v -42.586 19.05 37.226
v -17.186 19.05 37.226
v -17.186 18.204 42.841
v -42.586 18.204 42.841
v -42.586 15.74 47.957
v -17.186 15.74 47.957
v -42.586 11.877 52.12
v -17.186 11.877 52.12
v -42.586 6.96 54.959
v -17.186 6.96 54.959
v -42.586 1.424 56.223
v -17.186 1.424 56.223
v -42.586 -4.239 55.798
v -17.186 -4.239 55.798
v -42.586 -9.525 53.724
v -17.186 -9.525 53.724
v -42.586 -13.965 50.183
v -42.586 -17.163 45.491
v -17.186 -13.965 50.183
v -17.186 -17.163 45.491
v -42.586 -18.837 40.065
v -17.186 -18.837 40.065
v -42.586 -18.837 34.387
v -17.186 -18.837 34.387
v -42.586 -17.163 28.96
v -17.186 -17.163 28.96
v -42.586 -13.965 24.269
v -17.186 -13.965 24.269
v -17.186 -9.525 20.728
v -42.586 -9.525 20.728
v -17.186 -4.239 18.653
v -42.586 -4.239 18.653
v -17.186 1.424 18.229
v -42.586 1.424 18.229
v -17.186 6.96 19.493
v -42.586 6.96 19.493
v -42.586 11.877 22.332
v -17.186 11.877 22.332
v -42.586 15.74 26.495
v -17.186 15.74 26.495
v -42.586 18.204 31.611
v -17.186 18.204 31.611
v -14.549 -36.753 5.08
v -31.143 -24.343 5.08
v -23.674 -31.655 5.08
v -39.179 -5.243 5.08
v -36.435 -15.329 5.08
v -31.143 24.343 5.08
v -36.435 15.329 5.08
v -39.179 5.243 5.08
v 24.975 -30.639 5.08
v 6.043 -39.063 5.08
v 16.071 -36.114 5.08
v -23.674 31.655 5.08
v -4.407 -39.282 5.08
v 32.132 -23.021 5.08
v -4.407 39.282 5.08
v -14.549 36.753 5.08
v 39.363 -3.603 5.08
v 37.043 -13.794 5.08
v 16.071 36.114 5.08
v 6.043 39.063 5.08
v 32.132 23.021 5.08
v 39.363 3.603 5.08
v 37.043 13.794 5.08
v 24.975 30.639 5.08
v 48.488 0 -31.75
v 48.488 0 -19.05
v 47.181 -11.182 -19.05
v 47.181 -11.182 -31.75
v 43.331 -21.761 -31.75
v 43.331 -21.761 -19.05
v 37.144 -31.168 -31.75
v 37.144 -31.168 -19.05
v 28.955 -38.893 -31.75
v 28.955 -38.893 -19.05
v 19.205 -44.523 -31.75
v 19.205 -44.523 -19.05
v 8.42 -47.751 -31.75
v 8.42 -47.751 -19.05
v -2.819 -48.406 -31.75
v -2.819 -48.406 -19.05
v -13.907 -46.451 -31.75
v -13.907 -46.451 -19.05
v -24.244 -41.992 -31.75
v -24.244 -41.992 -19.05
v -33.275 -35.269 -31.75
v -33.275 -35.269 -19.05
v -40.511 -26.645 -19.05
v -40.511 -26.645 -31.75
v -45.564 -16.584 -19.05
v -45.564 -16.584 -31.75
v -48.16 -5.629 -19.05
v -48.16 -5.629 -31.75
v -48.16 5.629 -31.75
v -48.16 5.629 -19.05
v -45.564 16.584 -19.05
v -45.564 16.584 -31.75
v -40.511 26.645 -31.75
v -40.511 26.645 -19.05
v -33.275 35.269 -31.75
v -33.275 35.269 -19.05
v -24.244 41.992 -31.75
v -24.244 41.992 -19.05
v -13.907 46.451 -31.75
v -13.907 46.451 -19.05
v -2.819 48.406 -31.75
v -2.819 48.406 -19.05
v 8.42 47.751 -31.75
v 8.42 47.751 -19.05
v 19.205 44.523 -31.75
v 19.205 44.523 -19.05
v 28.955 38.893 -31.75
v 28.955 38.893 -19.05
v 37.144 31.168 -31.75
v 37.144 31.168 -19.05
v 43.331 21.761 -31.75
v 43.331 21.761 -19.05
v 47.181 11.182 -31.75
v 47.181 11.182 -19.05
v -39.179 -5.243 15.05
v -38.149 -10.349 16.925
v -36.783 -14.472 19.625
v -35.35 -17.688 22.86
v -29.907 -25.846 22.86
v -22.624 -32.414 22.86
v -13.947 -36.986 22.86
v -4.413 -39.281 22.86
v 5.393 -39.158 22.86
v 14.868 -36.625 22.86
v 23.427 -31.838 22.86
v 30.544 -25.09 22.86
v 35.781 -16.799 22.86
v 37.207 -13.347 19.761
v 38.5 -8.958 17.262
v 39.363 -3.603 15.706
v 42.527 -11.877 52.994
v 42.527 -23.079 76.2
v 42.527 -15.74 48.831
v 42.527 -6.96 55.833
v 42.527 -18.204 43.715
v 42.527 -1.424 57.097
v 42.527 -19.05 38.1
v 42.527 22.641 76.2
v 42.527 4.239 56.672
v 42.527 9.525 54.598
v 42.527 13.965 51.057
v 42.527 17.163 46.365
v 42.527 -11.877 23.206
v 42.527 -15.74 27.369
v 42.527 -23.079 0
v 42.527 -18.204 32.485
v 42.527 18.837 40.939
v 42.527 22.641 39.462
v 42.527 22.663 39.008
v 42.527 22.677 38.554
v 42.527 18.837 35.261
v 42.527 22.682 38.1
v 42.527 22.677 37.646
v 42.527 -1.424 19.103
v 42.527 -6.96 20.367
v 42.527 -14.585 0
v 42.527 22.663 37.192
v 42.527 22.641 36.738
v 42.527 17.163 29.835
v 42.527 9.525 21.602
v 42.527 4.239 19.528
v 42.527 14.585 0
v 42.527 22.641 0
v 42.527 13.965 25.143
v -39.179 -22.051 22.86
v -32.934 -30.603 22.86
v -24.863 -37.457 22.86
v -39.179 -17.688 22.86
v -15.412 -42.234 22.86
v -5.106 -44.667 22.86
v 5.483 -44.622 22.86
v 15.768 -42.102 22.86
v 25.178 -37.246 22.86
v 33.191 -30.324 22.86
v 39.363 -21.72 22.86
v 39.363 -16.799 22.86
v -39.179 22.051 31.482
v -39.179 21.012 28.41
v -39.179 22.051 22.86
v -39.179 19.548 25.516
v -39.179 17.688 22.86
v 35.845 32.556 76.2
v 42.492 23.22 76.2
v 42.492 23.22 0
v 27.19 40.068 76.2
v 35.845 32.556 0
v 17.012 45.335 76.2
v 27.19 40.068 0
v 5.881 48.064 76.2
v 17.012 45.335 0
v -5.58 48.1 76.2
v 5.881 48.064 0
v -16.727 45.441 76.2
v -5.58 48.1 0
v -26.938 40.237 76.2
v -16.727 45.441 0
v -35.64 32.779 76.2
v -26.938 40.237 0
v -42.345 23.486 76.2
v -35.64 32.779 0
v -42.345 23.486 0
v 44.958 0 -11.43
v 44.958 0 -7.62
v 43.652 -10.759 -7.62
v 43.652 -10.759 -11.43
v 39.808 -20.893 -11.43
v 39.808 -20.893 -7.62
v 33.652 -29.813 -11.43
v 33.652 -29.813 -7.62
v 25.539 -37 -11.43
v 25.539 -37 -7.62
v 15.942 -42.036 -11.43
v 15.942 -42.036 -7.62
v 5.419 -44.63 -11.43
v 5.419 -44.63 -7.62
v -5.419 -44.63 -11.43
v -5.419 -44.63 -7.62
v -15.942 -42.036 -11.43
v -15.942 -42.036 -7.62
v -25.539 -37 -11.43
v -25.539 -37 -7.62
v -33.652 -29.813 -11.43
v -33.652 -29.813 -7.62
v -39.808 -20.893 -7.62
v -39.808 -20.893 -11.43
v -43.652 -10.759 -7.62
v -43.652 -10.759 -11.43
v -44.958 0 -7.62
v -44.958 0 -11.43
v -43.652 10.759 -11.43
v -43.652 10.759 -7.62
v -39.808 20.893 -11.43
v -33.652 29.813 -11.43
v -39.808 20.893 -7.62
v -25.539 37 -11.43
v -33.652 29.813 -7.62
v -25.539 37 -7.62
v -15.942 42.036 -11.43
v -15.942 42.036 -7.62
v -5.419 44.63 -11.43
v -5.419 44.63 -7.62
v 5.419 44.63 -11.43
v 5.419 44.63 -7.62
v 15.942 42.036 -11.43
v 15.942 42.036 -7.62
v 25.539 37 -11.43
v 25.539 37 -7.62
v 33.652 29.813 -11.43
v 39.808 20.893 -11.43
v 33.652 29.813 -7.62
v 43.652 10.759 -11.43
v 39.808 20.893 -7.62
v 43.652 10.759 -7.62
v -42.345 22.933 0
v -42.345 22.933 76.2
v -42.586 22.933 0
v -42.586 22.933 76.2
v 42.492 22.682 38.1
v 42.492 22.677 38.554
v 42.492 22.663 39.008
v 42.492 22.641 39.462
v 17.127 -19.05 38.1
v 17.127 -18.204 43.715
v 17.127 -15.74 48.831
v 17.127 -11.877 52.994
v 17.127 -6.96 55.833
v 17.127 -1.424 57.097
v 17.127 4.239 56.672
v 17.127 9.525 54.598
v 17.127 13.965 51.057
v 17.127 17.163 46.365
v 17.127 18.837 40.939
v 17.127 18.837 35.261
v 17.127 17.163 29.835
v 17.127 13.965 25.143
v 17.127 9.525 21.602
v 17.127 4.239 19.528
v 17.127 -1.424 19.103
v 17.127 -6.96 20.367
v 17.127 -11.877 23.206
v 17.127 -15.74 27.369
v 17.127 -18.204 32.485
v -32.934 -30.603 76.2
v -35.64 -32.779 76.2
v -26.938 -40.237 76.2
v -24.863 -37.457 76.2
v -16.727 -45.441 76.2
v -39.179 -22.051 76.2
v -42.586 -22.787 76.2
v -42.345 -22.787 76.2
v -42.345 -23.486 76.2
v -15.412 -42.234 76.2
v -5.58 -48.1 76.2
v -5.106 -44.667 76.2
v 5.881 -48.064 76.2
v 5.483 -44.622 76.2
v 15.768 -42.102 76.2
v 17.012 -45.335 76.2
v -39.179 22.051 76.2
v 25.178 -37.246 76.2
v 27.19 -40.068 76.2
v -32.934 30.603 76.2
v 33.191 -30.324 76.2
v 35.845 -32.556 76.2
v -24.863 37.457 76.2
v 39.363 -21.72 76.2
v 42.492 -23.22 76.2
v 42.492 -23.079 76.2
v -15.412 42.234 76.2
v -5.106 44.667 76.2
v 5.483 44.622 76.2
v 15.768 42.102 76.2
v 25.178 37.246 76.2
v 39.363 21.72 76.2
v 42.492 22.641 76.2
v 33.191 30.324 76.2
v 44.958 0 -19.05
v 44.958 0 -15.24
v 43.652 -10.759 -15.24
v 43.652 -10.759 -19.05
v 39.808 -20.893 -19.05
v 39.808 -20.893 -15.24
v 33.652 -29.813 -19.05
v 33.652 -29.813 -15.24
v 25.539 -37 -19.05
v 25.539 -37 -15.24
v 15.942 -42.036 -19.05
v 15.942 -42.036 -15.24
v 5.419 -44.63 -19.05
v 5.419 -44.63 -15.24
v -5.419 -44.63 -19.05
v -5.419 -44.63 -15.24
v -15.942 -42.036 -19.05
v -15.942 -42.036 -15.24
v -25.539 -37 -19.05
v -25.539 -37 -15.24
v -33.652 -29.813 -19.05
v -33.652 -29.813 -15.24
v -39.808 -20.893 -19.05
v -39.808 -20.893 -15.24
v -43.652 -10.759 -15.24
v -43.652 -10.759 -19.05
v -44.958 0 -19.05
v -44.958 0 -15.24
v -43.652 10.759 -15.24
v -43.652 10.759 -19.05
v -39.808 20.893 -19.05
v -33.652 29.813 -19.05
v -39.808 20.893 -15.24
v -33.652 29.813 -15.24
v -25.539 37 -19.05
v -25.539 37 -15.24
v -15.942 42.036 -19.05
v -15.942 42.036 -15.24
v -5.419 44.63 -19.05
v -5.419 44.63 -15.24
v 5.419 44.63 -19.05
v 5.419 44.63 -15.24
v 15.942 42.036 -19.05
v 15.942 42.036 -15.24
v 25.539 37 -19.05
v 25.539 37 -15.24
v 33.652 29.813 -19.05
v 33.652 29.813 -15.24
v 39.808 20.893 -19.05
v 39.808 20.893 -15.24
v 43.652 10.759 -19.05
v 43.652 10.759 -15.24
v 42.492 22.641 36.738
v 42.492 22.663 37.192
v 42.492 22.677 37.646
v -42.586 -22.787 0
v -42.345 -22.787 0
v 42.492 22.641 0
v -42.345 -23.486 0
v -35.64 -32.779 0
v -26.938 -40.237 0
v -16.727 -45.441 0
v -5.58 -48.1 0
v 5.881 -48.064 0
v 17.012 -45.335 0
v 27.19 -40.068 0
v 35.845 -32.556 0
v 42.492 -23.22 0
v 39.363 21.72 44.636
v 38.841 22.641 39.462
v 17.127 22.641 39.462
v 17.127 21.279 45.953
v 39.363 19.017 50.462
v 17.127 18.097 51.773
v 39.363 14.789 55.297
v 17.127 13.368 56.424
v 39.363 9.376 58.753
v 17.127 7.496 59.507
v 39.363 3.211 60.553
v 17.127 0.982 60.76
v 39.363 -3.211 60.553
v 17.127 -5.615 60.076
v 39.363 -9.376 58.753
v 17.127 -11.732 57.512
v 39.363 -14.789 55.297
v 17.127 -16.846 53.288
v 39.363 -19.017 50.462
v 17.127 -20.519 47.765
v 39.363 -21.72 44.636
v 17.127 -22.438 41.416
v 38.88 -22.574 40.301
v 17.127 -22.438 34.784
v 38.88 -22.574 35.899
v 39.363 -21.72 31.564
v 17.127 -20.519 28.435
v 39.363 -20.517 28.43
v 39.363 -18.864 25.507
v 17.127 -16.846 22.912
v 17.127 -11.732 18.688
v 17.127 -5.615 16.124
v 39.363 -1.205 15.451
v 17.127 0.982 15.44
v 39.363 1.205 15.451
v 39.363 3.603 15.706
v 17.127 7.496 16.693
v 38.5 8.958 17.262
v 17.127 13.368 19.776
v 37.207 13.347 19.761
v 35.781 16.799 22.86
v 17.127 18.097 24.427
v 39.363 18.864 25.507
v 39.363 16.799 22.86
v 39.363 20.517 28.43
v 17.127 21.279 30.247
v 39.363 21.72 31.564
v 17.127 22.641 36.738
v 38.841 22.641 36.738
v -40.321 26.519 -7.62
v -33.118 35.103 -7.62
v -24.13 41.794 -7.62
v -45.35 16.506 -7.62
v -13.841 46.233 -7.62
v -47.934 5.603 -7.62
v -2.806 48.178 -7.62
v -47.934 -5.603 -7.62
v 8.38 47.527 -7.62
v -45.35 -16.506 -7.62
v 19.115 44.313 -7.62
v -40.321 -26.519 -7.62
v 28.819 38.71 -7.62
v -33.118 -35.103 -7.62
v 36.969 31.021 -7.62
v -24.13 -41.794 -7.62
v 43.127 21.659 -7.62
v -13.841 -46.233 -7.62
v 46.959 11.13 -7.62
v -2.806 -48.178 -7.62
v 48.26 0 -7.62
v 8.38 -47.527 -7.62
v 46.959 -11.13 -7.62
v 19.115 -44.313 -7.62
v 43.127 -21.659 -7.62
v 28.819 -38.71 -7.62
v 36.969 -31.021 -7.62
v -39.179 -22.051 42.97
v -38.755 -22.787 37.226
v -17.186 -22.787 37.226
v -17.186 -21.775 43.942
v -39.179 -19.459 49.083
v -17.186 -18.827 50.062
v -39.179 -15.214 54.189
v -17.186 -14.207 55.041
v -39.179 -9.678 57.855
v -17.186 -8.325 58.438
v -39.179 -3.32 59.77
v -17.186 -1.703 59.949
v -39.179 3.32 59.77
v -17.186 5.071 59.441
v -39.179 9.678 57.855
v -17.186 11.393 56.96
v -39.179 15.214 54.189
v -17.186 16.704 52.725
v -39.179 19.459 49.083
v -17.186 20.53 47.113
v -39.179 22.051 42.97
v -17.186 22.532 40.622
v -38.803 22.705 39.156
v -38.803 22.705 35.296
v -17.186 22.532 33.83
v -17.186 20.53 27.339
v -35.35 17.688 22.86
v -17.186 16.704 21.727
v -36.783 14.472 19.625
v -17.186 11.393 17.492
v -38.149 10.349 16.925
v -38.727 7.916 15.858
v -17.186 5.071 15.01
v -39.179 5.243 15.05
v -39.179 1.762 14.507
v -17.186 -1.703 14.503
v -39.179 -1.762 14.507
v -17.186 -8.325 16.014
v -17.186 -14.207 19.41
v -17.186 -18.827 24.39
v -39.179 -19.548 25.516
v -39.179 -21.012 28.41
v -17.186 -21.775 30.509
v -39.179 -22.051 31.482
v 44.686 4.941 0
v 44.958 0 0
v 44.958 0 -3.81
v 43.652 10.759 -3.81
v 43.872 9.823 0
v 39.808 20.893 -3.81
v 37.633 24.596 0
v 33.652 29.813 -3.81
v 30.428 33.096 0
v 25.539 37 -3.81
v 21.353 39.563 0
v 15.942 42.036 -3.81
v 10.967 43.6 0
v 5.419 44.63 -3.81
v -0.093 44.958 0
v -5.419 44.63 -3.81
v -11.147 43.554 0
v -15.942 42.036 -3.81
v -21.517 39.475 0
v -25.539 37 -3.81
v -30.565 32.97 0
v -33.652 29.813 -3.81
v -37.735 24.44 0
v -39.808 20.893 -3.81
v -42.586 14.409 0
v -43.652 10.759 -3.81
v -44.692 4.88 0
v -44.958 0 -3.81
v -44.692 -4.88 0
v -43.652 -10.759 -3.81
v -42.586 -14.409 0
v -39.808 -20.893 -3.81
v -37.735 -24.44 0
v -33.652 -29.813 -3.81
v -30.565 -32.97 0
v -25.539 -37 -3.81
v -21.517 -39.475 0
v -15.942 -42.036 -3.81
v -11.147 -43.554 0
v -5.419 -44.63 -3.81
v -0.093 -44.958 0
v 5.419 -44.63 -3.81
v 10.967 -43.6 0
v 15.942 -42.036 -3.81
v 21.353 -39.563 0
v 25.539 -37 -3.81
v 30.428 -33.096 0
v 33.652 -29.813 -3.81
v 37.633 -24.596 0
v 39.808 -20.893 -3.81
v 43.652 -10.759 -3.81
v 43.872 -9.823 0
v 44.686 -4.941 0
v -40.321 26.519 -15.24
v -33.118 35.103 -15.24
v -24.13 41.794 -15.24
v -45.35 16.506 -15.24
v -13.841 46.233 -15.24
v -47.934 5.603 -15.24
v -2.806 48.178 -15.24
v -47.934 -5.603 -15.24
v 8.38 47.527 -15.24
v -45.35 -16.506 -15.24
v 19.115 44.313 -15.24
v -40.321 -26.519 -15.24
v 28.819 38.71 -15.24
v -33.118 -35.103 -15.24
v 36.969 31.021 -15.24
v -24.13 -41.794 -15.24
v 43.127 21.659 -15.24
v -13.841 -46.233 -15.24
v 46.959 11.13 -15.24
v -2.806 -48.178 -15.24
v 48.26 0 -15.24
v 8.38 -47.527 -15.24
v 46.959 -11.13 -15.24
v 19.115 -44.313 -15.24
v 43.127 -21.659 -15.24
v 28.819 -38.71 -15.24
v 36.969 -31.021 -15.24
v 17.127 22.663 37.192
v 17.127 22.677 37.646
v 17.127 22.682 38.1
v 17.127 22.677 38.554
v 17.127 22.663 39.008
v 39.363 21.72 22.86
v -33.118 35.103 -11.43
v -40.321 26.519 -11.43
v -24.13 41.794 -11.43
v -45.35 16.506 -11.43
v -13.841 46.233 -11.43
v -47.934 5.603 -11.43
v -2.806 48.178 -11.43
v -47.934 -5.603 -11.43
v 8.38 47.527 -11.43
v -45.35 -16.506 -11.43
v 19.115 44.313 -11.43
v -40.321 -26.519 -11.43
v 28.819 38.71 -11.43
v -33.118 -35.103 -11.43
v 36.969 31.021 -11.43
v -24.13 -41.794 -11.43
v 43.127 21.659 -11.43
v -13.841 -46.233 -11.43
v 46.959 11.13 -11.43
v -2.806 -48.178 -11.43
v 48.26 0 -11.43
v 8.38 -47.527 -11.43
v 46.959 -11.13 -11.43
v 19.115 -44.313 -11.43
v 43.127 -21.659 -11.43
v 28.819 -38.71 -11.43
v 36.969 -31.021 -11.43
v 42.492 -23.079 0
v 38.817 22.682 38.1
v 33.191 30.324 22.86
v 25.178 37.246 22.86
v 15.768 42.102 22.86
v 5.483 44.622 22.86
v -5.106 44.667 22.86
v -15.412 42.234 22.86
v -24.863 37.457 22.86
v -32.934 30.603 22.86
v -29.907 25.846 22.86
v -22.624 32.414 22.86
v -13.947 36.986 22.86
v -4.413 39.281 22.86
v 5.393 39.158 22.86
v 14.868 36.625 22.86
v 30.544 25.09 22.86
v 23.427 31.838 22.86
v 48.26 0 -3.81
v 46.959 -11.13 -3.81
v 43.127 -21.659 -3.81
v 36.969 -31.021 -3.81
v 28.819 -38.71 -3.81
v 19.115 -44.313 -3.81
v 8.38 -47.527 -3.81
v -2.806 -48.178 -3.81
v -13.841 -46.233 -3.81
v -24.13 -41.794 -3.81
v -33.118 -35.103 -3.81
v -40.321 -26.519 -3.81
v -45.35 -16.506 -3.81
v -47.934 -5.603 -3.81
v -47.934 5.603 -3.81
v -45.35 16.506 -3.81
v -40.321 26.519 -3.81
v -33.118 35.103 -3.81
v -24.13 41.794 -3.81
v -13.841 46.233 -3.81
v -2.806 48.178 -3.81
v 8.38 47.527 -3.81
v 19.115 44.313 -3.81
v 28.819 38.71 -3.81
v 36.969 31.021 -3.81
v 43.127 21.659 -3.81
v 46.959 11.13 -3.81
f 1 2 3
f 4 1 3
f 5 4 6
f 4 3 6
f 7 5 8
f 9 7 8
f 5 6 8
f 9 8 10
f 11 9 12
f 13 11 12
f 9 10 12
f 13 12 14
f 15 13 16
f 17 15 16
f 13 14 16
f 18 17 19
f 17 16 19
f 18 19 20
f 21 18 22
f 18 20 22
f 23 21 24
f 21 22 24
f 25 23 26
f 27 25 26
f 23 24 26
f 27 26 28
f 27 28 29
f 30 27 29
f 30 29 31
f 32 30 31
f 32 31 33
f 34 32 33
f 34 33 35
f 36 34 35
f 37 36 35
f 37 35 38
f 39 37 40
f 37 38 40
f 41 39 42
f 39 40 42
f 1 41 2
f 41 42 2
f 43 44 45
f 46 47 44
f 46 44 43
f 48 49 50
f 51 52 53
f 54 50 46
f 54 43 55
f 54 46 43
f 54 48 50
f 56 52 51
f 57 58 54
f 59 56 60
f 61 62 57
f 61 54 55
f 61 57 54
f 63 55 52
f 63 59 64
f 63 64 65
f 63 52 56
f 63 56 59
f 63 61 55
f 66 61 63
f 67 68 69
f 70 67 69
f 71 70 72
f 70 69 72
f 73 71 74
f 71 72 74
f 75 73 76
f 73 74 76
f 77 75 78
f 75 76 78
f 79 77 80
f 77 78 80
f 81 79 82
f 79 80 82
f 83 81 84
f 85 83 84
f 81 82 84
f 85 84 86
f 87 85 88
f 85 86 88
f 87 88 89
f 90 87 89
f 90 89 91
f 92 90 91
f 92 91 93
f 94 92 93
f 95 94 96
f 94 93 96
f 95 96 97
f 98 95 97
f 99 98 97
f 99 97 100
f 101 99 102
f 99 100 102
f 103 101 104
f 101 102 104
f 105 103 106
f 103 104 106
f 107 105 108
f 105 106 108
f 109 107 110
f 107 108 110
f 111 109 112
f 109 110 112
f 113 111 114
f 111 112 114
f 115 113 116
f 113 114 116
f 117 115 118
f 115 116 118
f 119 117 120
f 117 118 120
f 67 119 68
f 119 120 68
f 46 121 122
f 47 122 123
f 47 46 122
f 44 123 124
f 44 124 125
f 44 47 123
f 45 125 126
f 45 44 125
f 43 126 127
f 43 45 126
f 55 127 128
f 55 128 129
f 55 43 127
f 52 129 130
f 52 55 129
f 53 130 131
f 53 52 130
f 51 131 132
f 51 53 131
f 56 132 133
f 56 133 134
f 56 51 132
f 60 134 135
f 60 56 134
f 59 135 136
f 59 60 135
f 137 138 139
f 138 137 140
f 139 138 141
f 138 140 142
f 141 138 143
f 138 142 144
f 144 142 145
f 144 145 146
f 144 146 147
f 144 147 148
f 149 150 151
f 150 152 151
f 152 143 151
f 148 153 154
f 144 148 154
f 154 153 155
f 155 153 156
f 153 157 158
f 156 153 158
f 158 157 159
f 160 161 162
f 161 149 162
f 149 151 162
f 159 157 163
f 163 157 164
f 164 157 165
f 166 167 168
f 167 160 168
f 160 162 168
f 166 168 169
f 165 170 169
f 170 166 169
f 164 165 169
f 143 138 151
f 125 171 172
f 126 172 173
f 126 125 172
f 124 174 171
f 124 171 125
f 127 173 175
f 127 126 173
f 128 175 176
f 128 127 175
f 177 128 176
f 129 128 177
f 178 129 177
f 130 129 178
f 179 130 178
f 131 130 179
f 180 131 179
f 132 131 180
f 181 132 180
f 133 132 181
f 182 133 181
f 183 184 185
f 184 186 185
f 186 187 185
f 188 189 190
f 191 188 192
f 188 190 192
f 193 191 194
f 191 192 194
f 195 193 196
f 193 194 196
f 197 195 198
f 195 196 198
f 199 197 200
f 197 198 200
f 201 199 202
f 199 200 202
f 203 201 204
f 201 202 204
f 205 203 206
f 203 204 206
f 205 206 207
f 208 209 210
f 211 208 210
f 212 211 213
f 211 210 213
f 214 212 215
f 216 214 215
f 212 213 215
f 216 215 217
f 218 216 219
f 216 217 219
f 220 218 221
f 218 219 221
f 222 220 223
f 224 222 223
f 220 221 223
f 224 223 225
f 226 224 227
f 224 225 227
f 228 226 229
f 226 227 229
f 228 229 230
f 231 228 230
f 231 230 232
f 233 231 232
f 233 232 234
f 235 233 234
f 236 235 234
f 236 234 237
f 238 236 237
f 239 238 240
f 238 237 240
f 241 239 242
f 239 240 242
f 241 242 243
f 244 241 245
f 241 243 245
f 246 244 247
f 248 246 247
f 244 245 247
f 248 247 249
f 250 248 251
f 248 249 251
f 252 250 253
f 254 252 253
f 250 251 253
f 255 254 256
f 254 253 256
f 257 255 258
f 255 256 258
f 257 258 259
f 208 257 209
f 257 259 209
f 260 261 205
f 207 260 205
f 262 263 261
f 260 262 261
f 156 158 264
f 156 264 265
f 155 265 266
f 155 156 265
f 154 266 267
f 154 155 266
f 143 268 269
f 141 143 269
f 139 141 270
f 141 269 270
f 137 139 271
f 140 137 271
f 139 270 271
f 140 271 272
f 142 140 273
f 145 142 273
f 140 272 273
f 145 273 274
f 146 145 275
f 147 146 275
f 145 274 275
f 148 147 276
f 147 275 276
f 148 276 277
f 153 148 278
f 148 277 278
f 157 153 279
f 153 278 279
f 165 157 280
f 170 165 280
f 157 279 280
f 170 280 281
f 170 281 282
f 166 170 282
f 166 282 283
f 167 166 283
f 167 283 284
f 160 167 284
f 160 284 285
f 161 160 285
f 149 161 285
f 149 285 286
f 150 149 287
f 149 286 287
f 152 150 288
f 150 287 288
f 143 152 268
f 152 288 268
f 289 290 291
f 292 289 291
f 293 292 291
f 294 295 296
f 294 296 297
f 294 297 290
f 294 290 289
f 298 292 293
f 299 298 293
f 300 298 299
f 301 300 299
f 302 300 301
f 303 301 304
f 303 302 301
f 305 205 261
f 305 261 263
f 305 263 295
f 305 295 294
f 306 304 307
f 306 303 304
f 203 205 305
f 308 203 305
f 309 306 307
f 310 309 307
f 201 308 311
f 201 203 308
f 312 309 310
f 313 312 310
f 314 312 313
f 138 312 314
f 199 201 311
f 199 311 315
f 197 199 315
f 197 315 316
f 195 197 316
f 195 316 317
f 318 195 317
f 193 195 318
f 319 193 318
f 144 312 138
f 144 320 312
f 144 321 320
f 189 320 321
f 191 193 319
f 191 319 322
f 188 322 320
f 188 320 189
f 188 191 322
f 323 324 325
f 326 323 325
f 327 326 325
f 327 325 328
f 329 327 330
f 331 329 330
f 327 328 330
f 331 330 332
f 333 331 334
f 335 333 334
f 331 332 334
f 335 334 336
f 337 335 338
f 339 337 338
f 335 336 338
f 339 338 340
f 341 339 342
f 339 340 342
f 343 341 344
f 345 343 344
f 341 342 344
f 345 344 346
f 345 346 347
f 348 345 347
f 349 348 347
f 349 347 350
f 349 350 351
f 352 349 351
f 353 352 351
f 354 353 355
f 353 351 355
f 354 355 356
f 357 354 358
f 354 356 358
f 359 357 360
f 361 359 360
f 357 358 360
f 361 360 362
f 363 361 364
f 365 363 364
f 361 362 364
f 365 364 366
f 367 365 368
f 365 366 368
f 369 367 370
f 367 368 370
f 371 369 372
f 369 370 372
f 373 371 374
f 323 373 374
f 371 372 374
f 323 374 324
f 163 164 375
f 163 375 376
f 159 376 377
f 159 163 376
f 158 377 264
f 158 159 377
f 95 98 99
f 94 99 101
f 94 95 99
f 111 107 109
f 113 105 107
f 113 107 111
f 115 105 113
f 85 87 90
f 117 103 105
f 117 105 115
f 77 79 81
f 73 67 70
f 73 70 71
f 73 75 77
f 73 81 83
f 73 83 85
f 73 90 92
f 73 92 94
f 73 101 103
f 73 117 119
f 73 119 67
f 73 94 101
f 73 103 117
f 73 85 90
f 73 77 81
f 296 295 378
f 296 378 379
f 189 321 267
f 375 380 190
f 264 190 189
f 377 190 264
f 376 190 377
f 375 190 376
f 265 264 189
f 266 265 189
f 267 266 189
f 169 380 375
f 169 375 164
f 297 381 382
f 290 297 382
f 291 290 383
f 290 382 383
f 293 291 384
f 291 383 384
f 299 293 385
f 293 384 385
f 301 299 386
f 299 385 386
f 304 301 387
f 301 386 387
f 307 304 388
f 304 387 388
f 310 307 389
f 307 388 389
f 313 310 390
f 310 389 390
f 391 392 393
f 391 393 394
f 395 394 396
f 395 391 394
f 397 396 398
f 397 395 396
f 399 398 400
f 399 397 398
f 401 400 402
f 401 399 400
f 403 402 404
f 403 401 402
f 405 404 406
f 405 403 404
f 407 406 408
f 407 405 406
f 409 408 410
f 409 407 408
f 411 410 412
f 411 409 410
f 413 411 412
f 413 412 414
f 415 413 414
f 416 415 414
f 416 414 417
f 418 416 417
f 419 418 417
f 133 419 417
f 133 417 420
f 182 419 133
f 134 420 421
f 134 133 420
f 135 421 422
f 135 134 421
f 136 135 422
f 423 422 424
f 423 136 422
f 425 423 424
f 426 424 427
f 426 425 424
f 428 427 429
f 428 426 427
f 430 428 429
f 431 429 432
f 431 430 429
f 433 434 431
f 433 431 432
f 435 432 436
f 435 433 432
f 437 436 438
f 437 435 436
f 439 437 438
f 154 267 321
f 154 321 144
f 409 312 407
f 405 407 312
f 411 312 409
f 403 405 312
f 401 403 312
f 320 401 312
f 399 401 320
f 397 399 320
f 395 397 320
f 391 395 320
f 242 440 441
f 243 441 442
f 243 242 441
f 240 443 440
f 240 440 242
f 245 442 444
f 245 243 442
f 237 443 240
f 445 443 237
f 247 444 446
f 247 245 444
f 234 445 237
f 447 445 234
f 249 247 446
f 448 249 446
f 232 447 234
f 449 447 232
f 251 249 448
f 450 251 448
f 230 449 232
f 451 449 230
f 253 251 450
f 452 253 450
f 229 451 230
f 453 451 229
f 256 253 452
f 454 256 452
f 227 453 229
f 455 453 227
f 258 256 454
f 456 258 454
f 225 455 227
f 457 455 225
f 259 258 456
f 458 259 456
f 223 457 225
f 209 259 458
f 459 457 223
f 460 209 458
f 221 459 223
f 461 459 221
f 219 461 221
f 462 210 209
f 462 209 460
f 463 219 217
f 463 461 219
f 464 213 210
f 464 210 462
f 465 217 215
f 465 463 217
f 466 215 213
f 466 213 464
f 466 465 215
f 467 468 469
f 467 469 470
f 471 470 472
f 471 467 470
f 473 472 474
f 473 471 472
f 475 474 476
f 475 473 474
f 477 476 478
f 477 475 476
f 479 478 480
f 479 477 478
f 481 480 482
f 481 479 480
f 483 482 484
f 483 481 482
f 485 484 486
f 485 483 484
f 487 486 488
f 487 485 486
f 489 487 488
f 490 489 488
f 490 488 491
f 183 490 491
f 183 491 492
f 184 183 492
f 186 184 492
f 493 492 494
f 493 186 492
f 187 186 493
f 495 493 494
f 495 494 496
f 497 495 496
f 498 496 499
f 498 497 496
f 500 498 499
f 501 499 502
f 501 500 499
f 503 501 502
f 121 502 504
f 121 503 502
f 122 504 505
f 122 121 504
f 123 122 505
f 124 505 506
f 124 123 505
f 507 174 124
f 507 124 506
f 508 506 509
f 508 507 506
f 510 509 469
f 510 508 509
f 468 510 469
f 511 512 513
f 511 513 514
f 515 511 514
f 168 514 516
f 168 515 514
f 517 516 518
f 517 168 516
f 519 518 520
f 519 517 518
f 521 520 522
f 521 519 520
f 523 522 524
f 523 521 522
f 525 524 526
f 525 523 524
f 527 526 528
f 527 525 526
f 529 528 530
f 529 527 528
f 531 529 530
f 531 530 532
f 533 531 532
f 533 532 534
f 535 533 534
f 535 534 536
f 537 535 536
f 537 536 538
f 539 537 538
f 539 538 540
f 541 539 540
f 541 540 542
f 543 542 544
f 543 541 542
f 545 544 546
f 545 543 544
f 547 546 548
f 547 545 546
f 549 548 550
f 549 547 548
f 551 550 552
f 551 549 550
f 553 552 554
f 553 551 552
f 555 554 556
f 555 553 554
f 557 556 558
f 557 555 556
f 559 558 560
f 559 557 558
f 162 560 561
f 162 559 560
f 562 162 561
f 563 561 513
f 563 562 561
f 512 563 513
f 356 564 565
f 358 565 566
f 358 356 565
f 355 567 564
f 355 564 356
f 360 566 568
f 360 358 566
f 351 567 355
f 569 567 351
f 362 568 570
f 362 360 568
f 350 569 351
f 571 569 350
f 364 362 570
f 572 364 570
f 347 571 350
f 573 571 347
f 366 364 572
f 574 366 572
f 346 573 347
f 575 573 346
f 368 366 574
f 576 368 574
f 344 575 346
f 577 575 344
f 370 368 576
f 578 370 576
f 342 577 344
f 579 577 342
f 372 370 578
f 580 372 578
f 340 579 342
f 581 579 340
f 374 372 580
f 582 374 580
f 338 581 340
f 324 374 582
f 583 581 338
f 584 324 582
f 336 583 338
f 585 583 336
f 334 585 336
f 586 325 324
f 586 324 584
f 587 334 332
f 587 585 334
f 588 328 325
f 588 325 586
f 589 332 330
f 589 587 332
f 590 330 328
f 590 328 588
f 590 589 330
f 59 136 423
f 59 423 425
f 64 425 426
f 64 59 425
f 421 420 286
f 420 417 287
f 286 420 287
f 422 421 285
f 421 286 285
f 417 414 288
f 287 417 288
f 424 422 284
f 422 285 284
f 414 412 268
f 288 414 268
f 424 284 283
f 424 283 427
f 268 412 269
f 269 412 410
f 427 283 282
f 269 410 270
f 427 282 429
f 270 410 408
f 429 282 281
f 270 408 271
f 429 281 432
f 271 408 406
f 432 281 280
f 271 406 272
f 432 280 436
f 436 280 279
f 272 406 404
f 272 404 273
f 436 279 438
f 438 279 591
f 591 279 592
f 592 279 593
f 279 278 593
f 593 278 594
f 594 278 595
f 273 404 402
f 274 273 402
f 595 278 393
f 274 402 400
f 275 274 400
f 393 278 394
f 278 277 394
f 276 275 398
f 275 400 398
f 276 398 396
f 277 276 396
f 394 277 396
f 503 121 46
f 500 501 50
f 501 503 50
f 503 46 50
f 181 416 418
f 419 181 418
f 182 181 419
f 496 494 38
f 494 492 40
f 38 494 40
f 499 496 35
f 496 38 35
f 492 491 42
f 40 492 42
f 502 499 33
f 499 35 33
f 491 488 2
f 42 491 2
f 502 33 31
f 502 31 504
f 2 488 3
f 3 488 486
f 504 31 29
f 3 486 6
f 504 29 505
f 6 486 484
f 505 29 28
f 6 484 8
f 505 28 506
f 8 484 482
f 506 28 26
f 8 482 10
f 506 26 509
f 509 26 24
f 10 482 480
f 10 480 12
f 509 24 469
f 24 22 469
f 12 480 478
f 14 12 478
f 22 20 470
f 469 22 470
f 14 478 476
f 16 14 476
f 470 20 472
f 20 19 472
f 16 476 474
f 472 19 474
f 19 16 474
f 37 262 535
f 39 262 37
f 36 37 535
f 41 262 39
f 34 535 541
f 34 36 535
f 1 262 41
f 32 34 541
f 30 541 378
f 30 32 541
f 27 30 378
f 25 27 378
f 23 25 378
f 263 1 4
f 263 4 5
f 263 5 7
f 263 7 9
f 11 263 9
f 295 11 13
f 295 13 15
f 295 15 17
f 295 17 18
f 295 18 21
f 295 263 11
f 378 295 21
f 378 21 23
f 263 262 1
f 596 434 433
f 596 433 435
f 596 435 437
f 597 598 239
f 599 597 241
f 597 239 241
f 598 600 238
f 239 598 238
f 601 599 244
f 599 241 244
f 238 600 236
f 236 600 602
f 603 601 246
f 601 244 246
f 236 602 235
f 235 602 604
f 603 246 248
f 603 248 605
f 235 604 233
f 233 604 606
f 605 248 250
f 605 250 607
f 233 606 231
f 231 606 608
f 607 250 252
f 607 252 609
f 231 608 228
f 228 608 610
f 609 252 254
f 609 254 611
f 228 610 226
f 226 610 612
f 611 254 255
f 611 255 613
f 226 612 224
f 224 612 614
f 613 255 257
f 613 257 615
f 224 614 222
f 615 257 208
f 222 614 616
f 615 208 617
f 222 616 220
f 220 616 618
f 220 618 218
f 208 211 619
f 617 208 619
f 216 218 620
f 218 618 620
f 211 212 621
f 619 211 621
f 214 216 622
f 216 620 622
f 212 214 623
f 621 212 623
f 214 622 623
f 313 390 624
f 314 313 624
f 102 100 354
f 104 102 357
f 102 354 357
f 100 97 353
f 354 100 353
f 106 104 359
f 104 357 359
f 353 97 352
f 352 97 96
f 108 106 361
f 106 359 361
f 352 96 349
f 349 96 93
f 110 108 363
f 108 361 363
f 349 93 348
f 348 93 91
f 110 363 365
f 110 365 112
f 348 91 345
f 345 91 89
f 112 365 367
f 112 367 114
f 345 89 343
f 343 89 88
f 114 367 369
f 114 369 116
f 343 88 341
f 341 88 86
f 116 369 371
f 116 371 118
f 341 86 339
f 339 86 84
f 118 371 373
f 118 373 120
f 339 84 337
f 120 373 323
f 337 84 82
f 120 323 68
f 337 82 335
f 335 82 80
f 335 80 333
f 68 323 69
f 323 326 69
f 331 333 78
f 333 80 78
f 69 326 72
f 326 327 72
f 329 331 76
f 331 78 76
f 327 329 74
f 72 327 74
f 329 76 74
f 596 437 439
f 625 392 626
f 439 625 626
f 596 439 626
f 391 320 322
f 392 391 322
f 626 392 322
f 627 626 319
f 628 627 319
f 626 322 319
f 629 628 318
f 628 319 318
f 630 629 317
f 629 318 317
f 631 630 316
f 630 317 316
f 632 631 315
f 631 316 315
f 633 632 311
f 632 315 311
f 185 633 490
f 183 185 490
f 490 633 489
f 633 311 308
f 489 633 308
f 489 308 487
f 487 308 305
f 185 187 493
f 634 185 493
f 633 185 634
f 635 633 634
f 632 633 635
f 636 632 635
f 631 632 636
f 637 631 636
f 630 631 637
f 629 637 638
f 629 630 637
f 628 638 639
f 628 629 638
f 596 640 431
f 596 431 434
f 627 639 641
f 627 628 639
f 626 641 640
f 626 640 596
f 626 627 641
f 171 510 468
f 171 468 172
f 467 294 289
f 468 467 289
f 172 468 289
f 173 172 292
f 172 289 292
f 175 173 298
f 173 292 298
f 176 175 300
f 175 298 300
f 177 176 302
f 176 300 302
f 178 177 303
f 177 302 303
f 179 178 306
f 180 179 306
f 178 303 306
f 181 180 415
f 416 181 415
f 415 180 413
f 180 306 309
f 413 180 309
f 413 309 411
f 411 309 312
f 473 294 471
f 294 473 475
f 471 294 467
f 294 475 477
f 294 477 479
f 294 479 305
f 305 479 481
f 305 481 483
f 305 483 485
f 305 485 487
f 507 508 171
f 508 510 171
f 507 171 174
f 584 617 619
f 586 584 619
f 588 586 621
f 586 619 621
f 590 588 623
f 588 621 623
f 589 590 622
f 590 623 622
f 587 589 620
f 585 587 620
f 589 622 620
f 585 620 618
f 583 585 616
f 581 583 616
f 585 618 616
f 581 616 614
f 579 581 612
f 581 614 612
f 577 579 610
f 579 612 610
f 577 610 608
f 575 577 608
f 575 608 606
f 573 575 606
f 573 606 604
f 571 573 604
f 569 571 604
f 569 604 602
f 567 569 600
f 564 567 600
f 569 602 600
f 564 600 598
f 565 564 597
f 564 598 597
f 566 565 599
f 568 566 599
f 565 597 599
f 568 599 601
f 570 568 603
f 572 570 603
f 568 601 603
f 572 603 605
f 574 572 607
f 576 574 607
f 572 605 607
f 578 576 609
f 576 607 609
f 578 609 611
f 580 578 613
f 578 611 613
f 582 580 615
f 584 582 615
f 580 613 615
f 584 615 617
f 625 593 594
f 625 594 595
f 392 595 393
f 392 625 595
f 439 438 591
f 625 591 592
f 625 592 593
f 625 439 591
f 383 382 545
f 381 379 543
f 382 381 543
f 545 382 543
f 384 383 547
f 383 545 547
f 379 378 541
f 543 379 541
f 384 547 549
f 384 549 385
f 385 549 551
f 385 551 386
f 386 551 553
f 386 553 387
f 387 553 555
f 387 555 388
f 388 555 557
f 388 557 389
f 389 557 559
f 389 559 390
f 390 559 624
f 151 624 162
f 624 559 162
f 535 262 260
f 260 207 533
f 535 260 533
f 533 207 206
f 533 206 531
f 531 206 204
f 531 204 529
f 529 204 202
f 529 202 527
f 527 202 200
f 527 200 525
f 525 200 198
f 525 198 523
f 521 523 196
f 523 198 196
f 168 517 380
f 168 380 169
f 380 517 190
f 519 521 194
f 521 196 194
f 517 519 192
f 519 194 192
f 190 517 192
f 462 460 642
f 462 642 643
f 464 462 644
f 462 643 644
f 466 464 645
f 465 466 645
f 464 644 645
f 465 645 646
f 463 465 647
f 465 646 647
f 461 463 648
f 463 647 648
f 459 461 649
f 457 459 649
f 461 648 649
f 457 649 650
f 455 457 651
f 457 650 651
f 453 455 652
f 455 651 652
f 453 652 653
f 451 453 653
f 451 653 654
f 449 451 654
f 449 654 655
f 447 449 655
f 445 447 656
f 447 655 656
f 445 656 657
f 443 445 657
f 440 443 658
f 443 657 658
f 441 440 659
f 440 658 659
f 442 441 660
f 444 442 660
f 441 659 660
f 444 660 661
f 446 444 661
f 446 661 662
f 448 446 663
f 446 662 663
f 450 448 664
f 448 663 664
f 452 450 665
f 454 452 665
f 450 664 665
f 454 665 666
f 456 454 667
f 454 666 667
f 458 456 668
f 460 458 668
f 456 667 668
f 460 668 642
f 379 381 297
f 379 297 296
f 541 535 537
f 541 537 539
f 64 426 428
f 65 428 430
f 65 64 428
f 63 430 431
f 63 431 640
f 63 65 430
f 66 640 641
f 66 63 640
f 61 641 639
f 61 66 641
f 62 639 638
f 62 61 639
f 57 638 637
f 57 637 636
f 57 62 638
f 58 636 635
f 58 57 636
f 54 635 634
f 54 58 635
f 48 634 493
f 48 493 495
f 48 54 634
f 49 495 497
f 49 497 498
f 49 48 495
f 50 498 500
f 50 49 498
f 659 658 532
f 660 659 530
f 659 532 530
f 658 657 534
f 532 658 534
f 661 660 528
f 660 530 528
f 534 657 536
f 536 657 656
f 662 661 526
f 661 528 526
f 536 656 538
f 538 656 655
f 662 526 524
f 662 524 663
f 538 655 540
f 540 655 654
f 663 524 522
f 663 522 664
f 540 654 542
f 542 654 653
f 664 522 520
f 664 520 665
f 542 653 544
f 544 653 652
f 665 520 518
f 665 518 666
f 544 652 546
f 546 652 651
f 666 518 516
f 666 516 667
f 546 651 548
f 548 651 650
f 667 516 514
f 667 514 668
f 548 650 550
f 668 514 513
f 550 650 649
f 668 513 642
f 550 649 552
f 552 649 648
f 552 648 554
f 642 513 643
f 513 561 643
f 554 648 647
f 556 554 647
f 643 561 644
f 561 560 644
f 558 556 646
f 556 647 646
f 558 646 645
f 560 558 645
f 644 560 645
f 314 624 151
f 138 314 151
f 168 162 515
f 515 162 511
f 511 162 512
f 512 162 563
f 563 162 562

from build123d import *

# Parameters (mm, degrees)
F0_R      = 48.4220762832
F1_DEPTH  = 76.2
F2_R      = 44.958
F3_DEPTH  = 71.12
F4_R      = 44.958
F5_DEPTH  = 3.81
F6_R      = 48.26
F7_DEPTH  = 3.81
F8_R      = 44.958
F9_DEPTH  = 3.81
F10_R     = 48.26
F11_DEPTH = 3.81
F12_R     = 44.958
F13_DEPTH = 3.81
F14_R     = 48.4881238819
F15_DEPTH = 12.7
F16_R     = 44.958
F16_R_2   = 39.5280108498
F17_DEPTH = 17.78
F18_W     = 24.8659998178
F18_H     = 81.0338929296
F19_DEPTH = 76.201
F20_W     = 28.6690369248
F20_H     = 83.0816850066
F21_DEPTH = 76.201
F22_W     = 3.4077020206
F22_H     = 45.72
F23_DEPTH = 76.2
F24_W     = 3.1630169219
F24_H     = 45.72
F25_DEPTH = 76.2
F26_R     = 22.7868641695
F27_DEPTH = 25.4
F28_R     = 19.05
F29_DEPTH = 25.4
F31_DEPTH = 25.4
F32_R     = 19.05
F33_DEPTH = 25.4


with BuildPart() as f1:
    # F0 (on Top) → F1 (new body)
    with BuildSketch(Plane.XY):
        Circle(F0_R)
    extrude(amount=F1_DEPTH)

    # F2 (on face) → F3 (cut)
    with BuildSketch(Plane.XY.offset(76.2)):
        Circle(F2_R)
    extrude(amount=-F3_DEPTH, mode=Mode.SUBTRACT)

    # F4 (on Top) → F5 (join)
    with BuildSketch(Plane.XY):
        Circle(F4_R)
    extrude(amount=-F5_DEPTH)

    # F6 (on face) → F7 (join)
    with BuildSketch(Plane(origin=(0, 0, -3.81), x_dir=(1, 0, 0), z_dir=(0, 0, -1))):
        Circle(F6_R)
    extrude(amount=F7_DEPTH)

    # F8 (on face) → F9 (join)
    with BuildSketch(Plane(origin=(0, 0, -7.62), x_dir=(1, 0, 0), z_dir=(0, 0, -1))):
        Circle(F8_R)
    extrude(amount=F9_DEPTH)

    # F10 (on face) → F11 (join)
    with BuildSketch(Plane(origin=(0, 0, -11.43), x_dir=(1, 0, 0), z_dir=(0, 0, -1))):
        Circle(F10_R)
    extrude(amount=F11_DEPTH)

    # F12 (on face) → F13 (join)
    with BuildSketch(Plane(origin=(0, 0, -15.24), x_dir=(1, 0, 0), z_dir=(0, 0, -1))):
        Circle(F12_R)
    extrude(amount=F13_DEPTH)

    # F14 (on face) → F15 (join)
    with BuildSketch(Plane(origin=(0, 0, -19.05), x_dir=(1, 0, 0), z_dir=(0, 0, -1))):
        Circle(F14_R)
    extrude(amount=F15_DEPTH)

    # F16 (on face) → F17 (join)
    with BuildSketch(Plane.XY.offset(5.08)):
        Circle(F16_R)
        Circle(F16_R_2, mode=Mode.SUBTRACT)
    extrude(amount=F17_DEPTH)

    # F18 (on Top) → F19 (cut, through all)
    with BuildSketch(Plane.XY):
        with Locations((-54.7783300281, -4.0224418044)):
            Rectangle(F18_W, F18_H)
    extrude(amount=F19_DEPTH, mode=Mode.SUBTRACT)

    # F20 (on Top) → F21 (cut, through all)
    with BuildSketch(Plane.XY):
        with Locations((56.8261183798, -3.8761682808)):
            Rectangle(F20_W, F20_H)
    extrude(amount=F21_DEPTH, mode=Mode.SUBTRACT)

    # F22 (on Top) → F23 (join)
    with BuildSketch(Plane.XY):
        with Locations((-40.8826228231, 0.0731358305)):
            Rectangle(F22_W, F22_H)
    extrude(amount=F23_DEPTH)

    # F24 (on Top) → F25 (join)
    with BuildSketch(Plane.XY):
        with Locations((40.9449934959, -0.2194056287)):
            Rectangle(F24_W, F24_H)
    extrude(amount=F25_DEPTH)

    # F26 (on face) → F27 (join)
    with BuildSketch(Plane(origin=(-42.5864738334, 0, 0), x_dir=(0, -1, 0), z_dir=(-1, 0, 0))):
        with Locations((0, 37.2258611023)):
            Circle(F26_R)
    extrude(amount=-F27_DEPTH)

    # F28 (on face) → F29 (cut)
    with BuildSketch(Plane.YZ.offset(-17.1864738334)):
        with Locations((0, 37.2258611023)):
            Circle(F28_R)
    extrude(amount=-F29_DEPTH, mode=Mode.SUBTRACT)

    # F30 (on face) → F31 (join)
    with BuildSketch(Plane.YZ.offset(42.5265019569)):
        with BuildLine():
            Line((22.6405943713, 36.7378248993), (22.6405943713, 39.4621751007))
            ThreePointArc((22.6405943713, 39.4621751007), (-22.6815350999, 38.1), (22.6405943713, 36.7378248993))
        make_face()
        with BuildLine():
            ThreePointArc((22.6405943713, 36.7378248993), (22.6712976074, 37.4186048965), (22.6815350999, 38.1))
            ThreePointArc((22.6815350999, 38.1), (22.6712976074, 38.7813951035), (22.6405943713, 39.4621751007))
            Line((22.6405943713, 39.4621751007), (22.6405943713, 36.7378248993))
        make_face()
    extrude(amount=-F31_DEPTH)

    # F32 (on face) → F33 (cut)
    with BuildSketch(Plane(origin=(17.1265019569, 0, 0), x_dir=(0, -1, 0), z_dir=(-1, 0, 0))):
        with Locations((0, 38.1)):
            Circle(F32_R)
    extrude(amount=-F33_DEPTH, mode=Mode.SUBTRACT)


solid = f1.part
